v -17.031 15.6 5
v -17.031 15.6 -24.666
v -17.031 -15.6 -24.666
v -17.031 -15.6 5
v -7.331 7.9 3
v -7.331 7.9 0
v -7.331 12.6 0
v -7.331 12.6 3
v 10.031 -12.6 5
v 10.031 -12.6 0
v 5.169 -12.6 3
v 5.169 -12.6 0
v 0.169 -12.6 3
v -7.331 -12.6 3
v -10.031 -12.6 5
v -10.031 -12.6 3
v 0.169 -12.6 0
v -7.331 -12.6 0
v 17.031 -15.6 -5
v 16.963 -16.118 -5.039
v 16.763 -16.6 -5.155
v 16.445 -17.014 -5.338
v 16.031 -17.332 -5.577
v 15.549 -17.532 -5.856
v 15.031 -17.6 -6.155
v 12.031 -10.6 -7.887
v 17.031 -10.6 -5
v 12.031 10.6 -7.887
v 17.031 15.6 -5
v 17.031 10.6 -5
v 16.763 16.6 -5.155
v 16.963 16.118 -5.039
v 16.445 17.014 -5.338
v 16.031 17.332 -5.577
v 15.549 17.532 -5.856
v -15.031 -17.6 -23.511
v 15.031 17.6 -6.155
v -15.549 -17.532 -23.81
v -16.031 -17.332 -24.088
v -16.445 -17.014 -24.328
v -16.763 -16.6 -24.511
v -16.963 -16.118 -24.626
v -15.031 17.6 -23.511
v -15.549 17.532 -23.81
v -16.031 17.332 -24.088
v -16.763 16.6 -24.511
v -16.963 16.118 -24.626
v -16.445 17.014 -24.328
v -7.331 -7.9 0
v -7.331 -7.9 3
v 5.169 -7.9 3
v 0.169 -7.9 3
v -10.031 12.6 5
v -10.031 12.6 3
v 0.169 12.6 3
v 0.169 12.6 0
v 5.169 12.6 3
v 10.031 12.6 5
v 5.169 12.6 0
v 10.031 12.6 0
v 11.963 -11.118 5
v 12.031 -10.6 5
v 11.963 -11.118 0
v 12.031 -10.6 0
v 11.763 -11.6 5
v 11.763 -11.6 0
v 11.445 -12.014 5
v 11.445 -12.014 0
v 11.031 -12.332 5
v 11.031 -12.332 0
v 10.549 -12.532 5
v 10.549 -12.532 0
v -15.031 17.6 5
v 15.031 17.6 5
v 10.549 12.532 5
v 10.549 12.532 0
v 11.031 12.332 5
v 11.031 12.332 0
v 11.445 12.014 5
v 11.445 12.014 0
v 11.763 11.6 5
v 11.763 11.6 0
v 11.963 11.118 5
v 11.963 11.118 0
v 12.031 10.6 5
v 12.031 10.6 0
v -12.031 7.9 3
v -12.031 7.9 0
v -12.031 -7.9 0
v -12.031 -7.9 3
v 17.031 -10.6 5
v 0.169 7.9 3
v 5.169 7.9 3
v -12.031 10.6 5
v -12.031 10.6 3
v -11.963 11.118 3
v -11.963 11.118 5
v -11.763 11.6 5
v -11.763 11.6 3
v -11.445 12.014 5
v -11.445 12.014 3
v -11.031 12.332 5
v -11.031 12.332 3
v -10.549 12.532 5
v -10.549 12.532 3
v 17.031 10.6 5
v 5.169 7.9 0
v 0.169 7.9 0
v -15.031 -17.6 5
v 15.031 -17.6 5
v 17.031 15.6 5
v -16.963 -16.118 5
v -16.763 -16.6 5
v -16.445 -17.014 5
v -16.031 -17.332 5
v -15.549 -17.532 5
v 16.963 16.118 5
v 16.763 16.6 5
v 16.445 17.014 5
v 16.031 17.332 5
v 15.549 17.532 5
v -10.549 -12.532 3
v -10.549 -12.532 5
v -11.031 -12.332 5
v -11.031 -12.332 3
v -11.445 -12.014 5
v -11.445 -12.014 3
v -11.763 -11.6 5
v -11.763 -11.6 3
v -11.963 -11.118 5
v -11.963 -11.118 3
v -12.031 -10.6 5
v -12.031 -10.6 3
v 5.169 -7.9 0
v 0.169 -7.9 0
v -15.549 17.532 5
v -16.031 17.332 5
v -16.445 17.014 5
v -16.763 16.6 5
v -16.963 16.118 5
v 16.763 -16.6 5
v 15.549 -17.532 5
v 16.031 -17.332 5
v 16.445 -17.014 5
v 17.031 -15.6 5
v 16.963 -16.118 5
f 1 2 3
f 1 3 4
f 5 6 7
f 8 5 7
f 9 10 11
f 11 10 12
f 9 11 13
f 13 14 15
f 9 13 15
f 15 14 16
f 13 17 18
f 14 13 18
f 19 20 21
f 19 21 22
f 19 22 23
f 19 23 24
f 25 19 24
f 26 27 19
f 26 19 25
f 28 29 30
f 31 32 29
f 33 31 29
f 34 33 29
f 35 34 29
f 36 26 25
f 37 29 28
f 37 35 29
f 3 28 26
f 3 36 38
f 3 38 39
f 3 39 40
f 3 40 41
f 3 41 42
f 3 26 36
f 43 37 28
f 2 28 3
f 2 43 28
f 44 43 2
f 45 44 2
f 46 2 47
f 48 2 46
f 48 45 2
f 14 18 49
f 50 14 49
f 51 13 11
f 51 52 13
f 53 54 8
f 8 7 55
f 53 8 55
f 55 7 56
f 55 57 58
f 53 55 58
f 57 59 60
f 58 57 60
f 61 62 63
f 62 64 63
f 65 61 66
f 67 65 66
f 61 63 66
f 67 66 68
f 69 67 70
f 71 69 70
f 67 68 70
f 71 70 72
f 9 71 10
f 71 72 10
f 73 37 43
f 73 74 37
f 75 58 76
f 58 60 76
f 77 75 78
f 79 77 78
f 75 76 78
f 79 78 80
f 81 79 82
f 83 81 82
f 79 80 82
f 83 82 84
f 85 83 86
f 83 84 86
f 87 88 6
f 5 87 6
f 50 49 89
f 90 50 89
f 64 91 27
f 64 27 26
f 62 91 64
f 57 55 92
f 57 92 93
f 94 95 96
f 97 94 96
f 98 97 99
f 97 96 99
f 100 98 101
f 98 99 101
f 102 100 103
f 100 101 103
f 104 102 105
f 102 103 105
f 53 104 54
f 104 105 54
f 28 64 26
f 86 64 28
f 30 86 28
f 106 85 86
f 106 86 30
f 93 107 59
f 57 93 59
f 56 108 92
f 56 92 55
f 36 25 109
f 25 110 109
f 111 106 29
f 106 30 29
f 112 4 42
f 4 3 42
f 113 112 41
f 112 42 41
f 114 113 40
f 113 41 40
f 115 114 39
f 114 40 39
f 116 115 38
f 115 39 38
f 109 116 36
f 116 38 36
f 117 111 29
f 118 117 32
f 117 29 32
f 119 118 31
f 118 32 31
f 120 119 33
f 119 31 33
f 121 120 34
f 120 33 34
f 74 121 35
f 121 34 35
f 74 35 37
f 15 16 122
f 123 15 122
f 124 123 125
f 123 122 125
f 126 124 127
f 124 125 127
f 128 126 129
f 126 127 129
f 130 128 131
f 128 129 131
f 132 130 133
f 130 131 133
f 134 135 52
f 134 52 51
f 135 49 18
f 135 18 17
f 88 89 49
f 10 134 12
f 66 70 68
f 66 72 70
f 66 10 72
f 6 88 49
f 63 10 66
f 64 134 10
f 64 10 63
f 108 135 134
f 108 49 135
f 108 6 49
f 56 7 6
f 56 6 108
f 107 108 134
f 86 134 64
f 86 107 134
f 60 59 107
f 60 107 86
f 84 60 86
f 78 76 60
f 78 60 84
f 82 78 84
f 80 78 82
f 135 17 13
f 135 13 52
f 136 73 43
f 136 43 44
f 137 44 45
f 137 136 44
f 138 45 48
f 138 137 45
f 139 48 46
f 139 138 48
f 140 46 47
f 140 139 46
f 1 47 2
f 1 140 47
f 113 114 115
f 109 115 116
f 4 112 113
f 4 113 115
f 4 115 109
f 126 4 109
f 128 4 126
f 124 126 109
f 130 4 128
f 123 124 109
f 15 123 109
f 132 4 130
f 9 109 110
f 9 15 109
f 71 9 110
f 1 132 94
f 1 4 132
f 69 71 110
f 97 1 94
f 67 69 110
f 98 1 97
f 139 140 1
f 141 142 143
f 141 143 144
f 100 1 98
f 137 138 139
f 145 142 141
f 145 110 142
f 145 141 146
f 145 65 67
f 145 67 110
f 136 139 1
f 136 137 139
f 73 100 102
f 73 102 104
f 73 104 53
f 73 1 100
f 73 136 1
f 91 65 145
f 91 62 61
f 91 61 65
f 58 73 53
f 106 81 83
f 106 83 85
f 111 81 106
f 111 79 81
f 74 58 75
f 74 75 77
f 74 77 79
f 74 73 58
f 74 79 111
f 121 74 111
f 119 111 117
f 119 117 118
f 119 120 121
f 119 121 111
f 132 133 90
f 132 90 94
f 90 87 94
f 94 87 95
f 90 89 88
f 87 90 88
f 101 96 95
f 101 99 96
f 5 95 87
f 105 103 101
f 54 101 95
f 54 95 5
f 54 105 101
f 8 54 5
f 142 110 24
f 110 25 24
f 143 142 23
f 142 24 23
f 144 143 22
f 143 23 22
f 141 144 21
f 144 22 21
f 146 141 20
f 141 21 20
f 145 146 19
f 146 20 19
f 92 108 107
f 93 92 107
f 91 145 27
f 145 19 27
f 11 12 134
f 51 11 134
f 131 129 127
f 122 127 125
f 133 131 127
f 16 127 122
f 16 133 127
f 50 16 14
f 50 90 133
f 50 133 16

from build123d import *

# Parameters (mm, degrees)
F0_W     = 5
F0_H     = 4.7
F1_DEPTH = 5
F2_DEPTH = 3
F4_DEPTH = 2
F6_DEPTH = 35.2
F7_DEPTH = 25
F8_DEPTH = 25


with BuildPart() as f1:
    # F0 (on Top) → F1 (new body)
    with BuildSketch(Plane.XY):
        with BuildLine():
            ThreePointArc((12.031, -10.6), (11.4452135624, -12.0142135624), (10.031, -12.6))
            Line((10.031, -12.6), (5.169, -12.6))
            Line((5.169, -12.6), (0.169, -12.6))
            Line((0.169, -12.6), (-7.331, -12.6))
            Line((-7.331, -12.6), (-10.031, -12.6))
            ThreePointArc((-10.031, -12.6), (-11.4452135624, -12.0142135624), (-12.031, -10.6))
            Line((-12.031, -10.6), (-12.031, -7.9))
            Line((-12.031, -7.9), (-12.031, 7.9))
            Line((-12.031, 7.9), (-12.031, 10.6))
            ThreePointArc((-12.031, 10.6), (-11.4452135624, 12.0142135624), (-10.031, 12.6))
            Line((-10.031, 12.6), (-7.331, 12.6))
            Line((-7.331, 12.6), (0.169, 12.6))
            Line((0.169, 12.6), (5.169, 12.6))
            Line((5.169, 12.6), (10.031, 12.6))
            ThreePointArc((10.031, 12.6), (11.4452135624, 12.0142135624), (12.031, 10.6))
            Line((12.031, 10.6), (17.031, 10.6))
            Line((17.031, 10.6), (17.031, 15.6))
            ThreePointArc((17.031, 15.6), (16.4452135624, 17.0142135624), (15.031, 17.6))
            Line((15.031, 17.6), (-15.031, 17.6))
            ThreePointArc((-15.031, 17.6), (-16.4452135624, 17.0142135624), (-17.031, 15.6))
            Line((-17.031, 15.6), (-17.031, -15.6))
            ThreePointArc((-17.031, -15.6), (-16.4452135624, -17.0142135624), (-15.031, -17.6))
            Line((-15.031, -17.6), (15.031, -17.6))
            ThreePointArc((15.031, -17.6), (16.4452135624, -17.0142135624), (17.031, -15.6))
            Line((17.031, -15.6), (17.031, -10.6))
            Line((17.031, -10.6), (12.031, -10.6))
        make_face()
        with BuildLine():
            Line((5.169, -12.6), (10.031, -12.6))
            ThreePointArc((10.031, -12.6), (11.4452135624, -12.0142135624), (12.031, -10.6))
            Line((12.031, -10.6), (12.031, -10.4))
            Line((12.031, -10.4), (12.031, 10.4))
            Line((12.031, 10.4), (12.031, 10.6))
            ThreePointArc((12.031, 10.6), (11.4452135624, 12.0142135624), (10.031, 12.6))
            Line((10.031, 12.6), (5.169, 12.6))
            Line((5.169, 12.6), (5.169, 7.9))
            Line((5.169, 7.9), (0.169, 7.9))
            Line((0.169, 7.9), (0.169, 12.6))
            Line((0.169, 12.6), (-7.331, 12.6))
            Line((-7.331, 12.6), (-7.331, 7.9))
            Line((-7.331, 7.9), (-12.031, 7.9))
            Line((-12.031, 7.9), (-12.031, -7.9))
            Line((-12.031, -7.9), (-7.331, -7.9))
            Line((-7.331, -7.9), (-7.331, -12.6))
            Line((-7.331, -12.6), (0.169, -12.6))
            Line((0.169, -12.6), (0.169, -7.9))
            Line((0.169, -7.9), (5.169, -7.9))
            Line((5.169, -7.9), (5.169, -12.6))
        make_face()
        with BuildLine():
            Line((-12.031, 10.6), (-12.031, 7.9))
            Line((-12.031, 7.9), (-7.331, 7.9))
            Line((-7.331, 7.9), (-7.331, 12.6))
            Line((-7.331, 12.6), (-10.031, 12.6))
            ThreePointArc((-10.031, 12.6), (-11.4452135624, 12.0142135624), (-12.031, 10.6))
        make_face()
        with Locations((2.669, 10.25)):
            Rectangle(F0_W, F0_H)
        with Locations((2.669, -10.25)):
            Rectangle(F0_W, F0_H)
        with BuildLine():
            Line((-10.031, -12.6), (-7.331, -12.6))
            Line((-7.331, -12.6), (-7.331, -7.9))
            Line((-7.331, -7.9), (-12.031, -7.9))
            Line((-12.031, -7.9), (-12.031, -10.6))
            ThreePointArc((-12.031, -10.6), (-11.4452135624, -12.0142135624), (-10.031, -12.6))
        make_face()
    extrude(amount=-F1_DEPTH)

    # F0 (on Top) → F2 (join)
    with BuildSketch(Plane.XY):
        with BuildLine():
            ThreePointArc((12.031, -10.6), (11.4452135624, -12.0142135624), (10.031, -12.6))
            Line((10.031, -12.6), (5.169, -12.6))
            Line((5.169, -12.6), (0.169, -12.6))
            Line((0.169, -12.6), (-7.331, -12.6))
            Line((-7.331, -12.6), (-10.031, -12.6))
            ThreePointArc((-10.031, -12.6), (-11.4452135624, -12.0142135624), (-12.031, -10.6))
            Line((-12.031, -10.6), (-12.031, -7.9))
            Line((-12.031, -7.9), (-12.031, 7.9))
            Line((-12.031, 7.9), (-12.031, 10.6))
            ThreePointArc((-12.031, 10.6), (-11.4452135624, 12.0142135624), (-10.031, 12.6))
            Line((-10.031, 12.6), (-7.331, 12.6))
            Line((-7.331, 12.6), (0.169, 12.6))
            Line((0.169, 12.6), (5.169, 12.6))
            Line((5.169, 12.6), (10.031, 12.6))
            ThreePointArc((10.031, 12.6), (11.4452135624, 12.0142135624), (12.031, 10.6))
            Line((12.031, 10.6), (17.031, 10.6))
            Line((17.031, 10.6), (17.031, 15.6))
            ThreePointArc((17.031, 15.6), (16.4452135624, 17.0142135624), (15.031, 17.6))
            Line((15.031, 17.6), (-15.031, 17.6))
            ThreePointArc((-15.031, 17.6), (-16.4452135624, 17.0142135624), (-17.031, 15.6))
            Line((-17.031, 15.6), (-17.031, -15.6))
            ThreePointArc((-17.031, -15.6), (-16.4452135624, -17.0142135624), (-15.031, -17.6))
            Line((-15.031, -17.6), (15.031, -17.6))
            ThreePointArc((15.031, -17.6), (16.4452135624, -17.0142135624), (17.031, -15.6))
            Line((17.031, -15.6), (17.031, -10.6))
            Line((17.031, -10.6), (12.031, -10.6))
        make_face()
        with BuildLine():
            Line((-12.031, 10.6), (-12.031, 7.9))
            Line((-12.031, 7.9), (-7.331, 7.9))
            Line((-7.331, 7.9), (-7.331, 12.6))
            Line((-7.331, 12.6), (-10.031, 12.6))
            ThreePointArc((-10.031, 12.6), (-11.4452135624, 12.0142135624), (-12.031, 10.6))
        make_face()
        with Locations((2.669, 10.25)):
            Rectangle(F0_W, F0_H)
        with Locations((2.669, -10.25)):
            Rectangle(F0_W, F0_H)
        with BuildLine():
            Line((-10.031, -12.6), (-7.331, -12.6))
            Line((-7.331, -12.6), (-7.331, -7.9))
            Line((-7.331, -7.9), (-12.031, -7.9))
            Line((-12.031, -7.9), (-12.031, -10.6))
            ThreePointArc((-12.031, -10.6), (-11.4452135624, -12.0142135624), (-10.031, -12.6))
        make_face()
    extrude(amount=F2_DEPTH)

    # F3 (on face) → F4 (join)
    with BuildSketch(Plane.XY.offset(3)):
        with BuildLine():
            ThreePointArc((-12.031, 10.6), (-11.4452135624, 12.0142135624), (-10.031, 12.6))
            Line((-10.031, 12.6), (-7.331, 12.6))
            Line((-7.331, 12.6), (0.169, 12.6))
            Line((0.169, 12.6), (5.169, 12.6))
            Line((5.169, 12.6), (10.031, 12.6))
            ThreePointArc((10.031, 12.6), (11.4452135624, 12.0142135624), (12.031, 10.6))
            Line((12.031, 10.6), (17.031, 10.6))
            Line((17.031, 10.6), (17.031, 15.6))
            ThreePointArc((17.031, 15.6), (16.4452135624, 17.0142135624), (15.031, 17.6))
            Line((15.031, 17.6), (-15.031, 17.6))
            ThreePointArc((-15.031, 17.6), (-16.4452135624, 17.0142135624), (-17.031, 15.6))
            Line((-17.031, 15.6), (-17.031, -15.6))
            ThreePointArc((-17.031, -15.6), (-16.4452135624, -17.0142135624), (-15.031, -17.6))
            Line((-15.031, -17.6), (15.031, -17.6))
            ThreePointArc((15.031, -17.6), (16.4452135624, -17.0142135624), (17.031, -15.6))
            Line((17.031, -15.6), (17.031, -10.6))
            Line((17.031, -10.6), (12.031, -10.6))
            ThreePointArc((12.031, -10.6), (11.4452135624, -12.0142135624), (10.031, -12.6))
            Line((10.031, -12.6), (5.169, -12.6))
            Line((5.169, -12.6), (0.169, -12.6))
            Line((0.169, -12.6), (-7.331, -12.6))
            Line((-7.331, -12.6), (-10.031, -12.6))
            ThreePointArc((-10.031, -12.6), (-11.4452135624, -12.0142135624), (-12.031, -10.6))
            Line((-12.031, -10.6), (-12.031, -7.9))
            Line((-12.031, -7.9), (-12.031, 7.9))
            Line((-12.031, 7.9), (-12.031, 10.6))
        make_face()
    extrude(amount=F4_DEPTH)

    # F5 (on face) → F6 (join, through all)
    with BuildSketch(Plane(origin=(0, 17.6, 0), x_dir=(-1, 0, 0), z_dir=(0, 1, 0))):
        Polygon((17.031, -24.6657048691), (17.031, -5), (15.031, -5), (-15.031, -5), (-17.031, -5), align=None)
    extrude(amount=-F6_DEPTH)

    # F7 (cut): faces of the model
    f7_faces = [f1.faces().sort_by_distance(p)[0] for p in [
        (-16.5842641221, -17.1532641221, -5),
        (-16.5842641221, 17.1532641221, -5),
        (16.5842641221, 17.1532641221, -5),
        (16.5842641221, -17.1532641221, -5),
    ]]
    extrude(f7_faces, amount=-F7_DEPTH, mode=Mode.SUBTRACT)

    # F8 (cut): a face of the model
    f8_faces = [f1.faces().sort_by_distance(p)[0] for p in [
        (14.531, 0, -5),
    ]]
    extrude(f8_faces, amount=-F8_DEPTH, mode=Mode.SUBTRACT)


solid = f1.part
